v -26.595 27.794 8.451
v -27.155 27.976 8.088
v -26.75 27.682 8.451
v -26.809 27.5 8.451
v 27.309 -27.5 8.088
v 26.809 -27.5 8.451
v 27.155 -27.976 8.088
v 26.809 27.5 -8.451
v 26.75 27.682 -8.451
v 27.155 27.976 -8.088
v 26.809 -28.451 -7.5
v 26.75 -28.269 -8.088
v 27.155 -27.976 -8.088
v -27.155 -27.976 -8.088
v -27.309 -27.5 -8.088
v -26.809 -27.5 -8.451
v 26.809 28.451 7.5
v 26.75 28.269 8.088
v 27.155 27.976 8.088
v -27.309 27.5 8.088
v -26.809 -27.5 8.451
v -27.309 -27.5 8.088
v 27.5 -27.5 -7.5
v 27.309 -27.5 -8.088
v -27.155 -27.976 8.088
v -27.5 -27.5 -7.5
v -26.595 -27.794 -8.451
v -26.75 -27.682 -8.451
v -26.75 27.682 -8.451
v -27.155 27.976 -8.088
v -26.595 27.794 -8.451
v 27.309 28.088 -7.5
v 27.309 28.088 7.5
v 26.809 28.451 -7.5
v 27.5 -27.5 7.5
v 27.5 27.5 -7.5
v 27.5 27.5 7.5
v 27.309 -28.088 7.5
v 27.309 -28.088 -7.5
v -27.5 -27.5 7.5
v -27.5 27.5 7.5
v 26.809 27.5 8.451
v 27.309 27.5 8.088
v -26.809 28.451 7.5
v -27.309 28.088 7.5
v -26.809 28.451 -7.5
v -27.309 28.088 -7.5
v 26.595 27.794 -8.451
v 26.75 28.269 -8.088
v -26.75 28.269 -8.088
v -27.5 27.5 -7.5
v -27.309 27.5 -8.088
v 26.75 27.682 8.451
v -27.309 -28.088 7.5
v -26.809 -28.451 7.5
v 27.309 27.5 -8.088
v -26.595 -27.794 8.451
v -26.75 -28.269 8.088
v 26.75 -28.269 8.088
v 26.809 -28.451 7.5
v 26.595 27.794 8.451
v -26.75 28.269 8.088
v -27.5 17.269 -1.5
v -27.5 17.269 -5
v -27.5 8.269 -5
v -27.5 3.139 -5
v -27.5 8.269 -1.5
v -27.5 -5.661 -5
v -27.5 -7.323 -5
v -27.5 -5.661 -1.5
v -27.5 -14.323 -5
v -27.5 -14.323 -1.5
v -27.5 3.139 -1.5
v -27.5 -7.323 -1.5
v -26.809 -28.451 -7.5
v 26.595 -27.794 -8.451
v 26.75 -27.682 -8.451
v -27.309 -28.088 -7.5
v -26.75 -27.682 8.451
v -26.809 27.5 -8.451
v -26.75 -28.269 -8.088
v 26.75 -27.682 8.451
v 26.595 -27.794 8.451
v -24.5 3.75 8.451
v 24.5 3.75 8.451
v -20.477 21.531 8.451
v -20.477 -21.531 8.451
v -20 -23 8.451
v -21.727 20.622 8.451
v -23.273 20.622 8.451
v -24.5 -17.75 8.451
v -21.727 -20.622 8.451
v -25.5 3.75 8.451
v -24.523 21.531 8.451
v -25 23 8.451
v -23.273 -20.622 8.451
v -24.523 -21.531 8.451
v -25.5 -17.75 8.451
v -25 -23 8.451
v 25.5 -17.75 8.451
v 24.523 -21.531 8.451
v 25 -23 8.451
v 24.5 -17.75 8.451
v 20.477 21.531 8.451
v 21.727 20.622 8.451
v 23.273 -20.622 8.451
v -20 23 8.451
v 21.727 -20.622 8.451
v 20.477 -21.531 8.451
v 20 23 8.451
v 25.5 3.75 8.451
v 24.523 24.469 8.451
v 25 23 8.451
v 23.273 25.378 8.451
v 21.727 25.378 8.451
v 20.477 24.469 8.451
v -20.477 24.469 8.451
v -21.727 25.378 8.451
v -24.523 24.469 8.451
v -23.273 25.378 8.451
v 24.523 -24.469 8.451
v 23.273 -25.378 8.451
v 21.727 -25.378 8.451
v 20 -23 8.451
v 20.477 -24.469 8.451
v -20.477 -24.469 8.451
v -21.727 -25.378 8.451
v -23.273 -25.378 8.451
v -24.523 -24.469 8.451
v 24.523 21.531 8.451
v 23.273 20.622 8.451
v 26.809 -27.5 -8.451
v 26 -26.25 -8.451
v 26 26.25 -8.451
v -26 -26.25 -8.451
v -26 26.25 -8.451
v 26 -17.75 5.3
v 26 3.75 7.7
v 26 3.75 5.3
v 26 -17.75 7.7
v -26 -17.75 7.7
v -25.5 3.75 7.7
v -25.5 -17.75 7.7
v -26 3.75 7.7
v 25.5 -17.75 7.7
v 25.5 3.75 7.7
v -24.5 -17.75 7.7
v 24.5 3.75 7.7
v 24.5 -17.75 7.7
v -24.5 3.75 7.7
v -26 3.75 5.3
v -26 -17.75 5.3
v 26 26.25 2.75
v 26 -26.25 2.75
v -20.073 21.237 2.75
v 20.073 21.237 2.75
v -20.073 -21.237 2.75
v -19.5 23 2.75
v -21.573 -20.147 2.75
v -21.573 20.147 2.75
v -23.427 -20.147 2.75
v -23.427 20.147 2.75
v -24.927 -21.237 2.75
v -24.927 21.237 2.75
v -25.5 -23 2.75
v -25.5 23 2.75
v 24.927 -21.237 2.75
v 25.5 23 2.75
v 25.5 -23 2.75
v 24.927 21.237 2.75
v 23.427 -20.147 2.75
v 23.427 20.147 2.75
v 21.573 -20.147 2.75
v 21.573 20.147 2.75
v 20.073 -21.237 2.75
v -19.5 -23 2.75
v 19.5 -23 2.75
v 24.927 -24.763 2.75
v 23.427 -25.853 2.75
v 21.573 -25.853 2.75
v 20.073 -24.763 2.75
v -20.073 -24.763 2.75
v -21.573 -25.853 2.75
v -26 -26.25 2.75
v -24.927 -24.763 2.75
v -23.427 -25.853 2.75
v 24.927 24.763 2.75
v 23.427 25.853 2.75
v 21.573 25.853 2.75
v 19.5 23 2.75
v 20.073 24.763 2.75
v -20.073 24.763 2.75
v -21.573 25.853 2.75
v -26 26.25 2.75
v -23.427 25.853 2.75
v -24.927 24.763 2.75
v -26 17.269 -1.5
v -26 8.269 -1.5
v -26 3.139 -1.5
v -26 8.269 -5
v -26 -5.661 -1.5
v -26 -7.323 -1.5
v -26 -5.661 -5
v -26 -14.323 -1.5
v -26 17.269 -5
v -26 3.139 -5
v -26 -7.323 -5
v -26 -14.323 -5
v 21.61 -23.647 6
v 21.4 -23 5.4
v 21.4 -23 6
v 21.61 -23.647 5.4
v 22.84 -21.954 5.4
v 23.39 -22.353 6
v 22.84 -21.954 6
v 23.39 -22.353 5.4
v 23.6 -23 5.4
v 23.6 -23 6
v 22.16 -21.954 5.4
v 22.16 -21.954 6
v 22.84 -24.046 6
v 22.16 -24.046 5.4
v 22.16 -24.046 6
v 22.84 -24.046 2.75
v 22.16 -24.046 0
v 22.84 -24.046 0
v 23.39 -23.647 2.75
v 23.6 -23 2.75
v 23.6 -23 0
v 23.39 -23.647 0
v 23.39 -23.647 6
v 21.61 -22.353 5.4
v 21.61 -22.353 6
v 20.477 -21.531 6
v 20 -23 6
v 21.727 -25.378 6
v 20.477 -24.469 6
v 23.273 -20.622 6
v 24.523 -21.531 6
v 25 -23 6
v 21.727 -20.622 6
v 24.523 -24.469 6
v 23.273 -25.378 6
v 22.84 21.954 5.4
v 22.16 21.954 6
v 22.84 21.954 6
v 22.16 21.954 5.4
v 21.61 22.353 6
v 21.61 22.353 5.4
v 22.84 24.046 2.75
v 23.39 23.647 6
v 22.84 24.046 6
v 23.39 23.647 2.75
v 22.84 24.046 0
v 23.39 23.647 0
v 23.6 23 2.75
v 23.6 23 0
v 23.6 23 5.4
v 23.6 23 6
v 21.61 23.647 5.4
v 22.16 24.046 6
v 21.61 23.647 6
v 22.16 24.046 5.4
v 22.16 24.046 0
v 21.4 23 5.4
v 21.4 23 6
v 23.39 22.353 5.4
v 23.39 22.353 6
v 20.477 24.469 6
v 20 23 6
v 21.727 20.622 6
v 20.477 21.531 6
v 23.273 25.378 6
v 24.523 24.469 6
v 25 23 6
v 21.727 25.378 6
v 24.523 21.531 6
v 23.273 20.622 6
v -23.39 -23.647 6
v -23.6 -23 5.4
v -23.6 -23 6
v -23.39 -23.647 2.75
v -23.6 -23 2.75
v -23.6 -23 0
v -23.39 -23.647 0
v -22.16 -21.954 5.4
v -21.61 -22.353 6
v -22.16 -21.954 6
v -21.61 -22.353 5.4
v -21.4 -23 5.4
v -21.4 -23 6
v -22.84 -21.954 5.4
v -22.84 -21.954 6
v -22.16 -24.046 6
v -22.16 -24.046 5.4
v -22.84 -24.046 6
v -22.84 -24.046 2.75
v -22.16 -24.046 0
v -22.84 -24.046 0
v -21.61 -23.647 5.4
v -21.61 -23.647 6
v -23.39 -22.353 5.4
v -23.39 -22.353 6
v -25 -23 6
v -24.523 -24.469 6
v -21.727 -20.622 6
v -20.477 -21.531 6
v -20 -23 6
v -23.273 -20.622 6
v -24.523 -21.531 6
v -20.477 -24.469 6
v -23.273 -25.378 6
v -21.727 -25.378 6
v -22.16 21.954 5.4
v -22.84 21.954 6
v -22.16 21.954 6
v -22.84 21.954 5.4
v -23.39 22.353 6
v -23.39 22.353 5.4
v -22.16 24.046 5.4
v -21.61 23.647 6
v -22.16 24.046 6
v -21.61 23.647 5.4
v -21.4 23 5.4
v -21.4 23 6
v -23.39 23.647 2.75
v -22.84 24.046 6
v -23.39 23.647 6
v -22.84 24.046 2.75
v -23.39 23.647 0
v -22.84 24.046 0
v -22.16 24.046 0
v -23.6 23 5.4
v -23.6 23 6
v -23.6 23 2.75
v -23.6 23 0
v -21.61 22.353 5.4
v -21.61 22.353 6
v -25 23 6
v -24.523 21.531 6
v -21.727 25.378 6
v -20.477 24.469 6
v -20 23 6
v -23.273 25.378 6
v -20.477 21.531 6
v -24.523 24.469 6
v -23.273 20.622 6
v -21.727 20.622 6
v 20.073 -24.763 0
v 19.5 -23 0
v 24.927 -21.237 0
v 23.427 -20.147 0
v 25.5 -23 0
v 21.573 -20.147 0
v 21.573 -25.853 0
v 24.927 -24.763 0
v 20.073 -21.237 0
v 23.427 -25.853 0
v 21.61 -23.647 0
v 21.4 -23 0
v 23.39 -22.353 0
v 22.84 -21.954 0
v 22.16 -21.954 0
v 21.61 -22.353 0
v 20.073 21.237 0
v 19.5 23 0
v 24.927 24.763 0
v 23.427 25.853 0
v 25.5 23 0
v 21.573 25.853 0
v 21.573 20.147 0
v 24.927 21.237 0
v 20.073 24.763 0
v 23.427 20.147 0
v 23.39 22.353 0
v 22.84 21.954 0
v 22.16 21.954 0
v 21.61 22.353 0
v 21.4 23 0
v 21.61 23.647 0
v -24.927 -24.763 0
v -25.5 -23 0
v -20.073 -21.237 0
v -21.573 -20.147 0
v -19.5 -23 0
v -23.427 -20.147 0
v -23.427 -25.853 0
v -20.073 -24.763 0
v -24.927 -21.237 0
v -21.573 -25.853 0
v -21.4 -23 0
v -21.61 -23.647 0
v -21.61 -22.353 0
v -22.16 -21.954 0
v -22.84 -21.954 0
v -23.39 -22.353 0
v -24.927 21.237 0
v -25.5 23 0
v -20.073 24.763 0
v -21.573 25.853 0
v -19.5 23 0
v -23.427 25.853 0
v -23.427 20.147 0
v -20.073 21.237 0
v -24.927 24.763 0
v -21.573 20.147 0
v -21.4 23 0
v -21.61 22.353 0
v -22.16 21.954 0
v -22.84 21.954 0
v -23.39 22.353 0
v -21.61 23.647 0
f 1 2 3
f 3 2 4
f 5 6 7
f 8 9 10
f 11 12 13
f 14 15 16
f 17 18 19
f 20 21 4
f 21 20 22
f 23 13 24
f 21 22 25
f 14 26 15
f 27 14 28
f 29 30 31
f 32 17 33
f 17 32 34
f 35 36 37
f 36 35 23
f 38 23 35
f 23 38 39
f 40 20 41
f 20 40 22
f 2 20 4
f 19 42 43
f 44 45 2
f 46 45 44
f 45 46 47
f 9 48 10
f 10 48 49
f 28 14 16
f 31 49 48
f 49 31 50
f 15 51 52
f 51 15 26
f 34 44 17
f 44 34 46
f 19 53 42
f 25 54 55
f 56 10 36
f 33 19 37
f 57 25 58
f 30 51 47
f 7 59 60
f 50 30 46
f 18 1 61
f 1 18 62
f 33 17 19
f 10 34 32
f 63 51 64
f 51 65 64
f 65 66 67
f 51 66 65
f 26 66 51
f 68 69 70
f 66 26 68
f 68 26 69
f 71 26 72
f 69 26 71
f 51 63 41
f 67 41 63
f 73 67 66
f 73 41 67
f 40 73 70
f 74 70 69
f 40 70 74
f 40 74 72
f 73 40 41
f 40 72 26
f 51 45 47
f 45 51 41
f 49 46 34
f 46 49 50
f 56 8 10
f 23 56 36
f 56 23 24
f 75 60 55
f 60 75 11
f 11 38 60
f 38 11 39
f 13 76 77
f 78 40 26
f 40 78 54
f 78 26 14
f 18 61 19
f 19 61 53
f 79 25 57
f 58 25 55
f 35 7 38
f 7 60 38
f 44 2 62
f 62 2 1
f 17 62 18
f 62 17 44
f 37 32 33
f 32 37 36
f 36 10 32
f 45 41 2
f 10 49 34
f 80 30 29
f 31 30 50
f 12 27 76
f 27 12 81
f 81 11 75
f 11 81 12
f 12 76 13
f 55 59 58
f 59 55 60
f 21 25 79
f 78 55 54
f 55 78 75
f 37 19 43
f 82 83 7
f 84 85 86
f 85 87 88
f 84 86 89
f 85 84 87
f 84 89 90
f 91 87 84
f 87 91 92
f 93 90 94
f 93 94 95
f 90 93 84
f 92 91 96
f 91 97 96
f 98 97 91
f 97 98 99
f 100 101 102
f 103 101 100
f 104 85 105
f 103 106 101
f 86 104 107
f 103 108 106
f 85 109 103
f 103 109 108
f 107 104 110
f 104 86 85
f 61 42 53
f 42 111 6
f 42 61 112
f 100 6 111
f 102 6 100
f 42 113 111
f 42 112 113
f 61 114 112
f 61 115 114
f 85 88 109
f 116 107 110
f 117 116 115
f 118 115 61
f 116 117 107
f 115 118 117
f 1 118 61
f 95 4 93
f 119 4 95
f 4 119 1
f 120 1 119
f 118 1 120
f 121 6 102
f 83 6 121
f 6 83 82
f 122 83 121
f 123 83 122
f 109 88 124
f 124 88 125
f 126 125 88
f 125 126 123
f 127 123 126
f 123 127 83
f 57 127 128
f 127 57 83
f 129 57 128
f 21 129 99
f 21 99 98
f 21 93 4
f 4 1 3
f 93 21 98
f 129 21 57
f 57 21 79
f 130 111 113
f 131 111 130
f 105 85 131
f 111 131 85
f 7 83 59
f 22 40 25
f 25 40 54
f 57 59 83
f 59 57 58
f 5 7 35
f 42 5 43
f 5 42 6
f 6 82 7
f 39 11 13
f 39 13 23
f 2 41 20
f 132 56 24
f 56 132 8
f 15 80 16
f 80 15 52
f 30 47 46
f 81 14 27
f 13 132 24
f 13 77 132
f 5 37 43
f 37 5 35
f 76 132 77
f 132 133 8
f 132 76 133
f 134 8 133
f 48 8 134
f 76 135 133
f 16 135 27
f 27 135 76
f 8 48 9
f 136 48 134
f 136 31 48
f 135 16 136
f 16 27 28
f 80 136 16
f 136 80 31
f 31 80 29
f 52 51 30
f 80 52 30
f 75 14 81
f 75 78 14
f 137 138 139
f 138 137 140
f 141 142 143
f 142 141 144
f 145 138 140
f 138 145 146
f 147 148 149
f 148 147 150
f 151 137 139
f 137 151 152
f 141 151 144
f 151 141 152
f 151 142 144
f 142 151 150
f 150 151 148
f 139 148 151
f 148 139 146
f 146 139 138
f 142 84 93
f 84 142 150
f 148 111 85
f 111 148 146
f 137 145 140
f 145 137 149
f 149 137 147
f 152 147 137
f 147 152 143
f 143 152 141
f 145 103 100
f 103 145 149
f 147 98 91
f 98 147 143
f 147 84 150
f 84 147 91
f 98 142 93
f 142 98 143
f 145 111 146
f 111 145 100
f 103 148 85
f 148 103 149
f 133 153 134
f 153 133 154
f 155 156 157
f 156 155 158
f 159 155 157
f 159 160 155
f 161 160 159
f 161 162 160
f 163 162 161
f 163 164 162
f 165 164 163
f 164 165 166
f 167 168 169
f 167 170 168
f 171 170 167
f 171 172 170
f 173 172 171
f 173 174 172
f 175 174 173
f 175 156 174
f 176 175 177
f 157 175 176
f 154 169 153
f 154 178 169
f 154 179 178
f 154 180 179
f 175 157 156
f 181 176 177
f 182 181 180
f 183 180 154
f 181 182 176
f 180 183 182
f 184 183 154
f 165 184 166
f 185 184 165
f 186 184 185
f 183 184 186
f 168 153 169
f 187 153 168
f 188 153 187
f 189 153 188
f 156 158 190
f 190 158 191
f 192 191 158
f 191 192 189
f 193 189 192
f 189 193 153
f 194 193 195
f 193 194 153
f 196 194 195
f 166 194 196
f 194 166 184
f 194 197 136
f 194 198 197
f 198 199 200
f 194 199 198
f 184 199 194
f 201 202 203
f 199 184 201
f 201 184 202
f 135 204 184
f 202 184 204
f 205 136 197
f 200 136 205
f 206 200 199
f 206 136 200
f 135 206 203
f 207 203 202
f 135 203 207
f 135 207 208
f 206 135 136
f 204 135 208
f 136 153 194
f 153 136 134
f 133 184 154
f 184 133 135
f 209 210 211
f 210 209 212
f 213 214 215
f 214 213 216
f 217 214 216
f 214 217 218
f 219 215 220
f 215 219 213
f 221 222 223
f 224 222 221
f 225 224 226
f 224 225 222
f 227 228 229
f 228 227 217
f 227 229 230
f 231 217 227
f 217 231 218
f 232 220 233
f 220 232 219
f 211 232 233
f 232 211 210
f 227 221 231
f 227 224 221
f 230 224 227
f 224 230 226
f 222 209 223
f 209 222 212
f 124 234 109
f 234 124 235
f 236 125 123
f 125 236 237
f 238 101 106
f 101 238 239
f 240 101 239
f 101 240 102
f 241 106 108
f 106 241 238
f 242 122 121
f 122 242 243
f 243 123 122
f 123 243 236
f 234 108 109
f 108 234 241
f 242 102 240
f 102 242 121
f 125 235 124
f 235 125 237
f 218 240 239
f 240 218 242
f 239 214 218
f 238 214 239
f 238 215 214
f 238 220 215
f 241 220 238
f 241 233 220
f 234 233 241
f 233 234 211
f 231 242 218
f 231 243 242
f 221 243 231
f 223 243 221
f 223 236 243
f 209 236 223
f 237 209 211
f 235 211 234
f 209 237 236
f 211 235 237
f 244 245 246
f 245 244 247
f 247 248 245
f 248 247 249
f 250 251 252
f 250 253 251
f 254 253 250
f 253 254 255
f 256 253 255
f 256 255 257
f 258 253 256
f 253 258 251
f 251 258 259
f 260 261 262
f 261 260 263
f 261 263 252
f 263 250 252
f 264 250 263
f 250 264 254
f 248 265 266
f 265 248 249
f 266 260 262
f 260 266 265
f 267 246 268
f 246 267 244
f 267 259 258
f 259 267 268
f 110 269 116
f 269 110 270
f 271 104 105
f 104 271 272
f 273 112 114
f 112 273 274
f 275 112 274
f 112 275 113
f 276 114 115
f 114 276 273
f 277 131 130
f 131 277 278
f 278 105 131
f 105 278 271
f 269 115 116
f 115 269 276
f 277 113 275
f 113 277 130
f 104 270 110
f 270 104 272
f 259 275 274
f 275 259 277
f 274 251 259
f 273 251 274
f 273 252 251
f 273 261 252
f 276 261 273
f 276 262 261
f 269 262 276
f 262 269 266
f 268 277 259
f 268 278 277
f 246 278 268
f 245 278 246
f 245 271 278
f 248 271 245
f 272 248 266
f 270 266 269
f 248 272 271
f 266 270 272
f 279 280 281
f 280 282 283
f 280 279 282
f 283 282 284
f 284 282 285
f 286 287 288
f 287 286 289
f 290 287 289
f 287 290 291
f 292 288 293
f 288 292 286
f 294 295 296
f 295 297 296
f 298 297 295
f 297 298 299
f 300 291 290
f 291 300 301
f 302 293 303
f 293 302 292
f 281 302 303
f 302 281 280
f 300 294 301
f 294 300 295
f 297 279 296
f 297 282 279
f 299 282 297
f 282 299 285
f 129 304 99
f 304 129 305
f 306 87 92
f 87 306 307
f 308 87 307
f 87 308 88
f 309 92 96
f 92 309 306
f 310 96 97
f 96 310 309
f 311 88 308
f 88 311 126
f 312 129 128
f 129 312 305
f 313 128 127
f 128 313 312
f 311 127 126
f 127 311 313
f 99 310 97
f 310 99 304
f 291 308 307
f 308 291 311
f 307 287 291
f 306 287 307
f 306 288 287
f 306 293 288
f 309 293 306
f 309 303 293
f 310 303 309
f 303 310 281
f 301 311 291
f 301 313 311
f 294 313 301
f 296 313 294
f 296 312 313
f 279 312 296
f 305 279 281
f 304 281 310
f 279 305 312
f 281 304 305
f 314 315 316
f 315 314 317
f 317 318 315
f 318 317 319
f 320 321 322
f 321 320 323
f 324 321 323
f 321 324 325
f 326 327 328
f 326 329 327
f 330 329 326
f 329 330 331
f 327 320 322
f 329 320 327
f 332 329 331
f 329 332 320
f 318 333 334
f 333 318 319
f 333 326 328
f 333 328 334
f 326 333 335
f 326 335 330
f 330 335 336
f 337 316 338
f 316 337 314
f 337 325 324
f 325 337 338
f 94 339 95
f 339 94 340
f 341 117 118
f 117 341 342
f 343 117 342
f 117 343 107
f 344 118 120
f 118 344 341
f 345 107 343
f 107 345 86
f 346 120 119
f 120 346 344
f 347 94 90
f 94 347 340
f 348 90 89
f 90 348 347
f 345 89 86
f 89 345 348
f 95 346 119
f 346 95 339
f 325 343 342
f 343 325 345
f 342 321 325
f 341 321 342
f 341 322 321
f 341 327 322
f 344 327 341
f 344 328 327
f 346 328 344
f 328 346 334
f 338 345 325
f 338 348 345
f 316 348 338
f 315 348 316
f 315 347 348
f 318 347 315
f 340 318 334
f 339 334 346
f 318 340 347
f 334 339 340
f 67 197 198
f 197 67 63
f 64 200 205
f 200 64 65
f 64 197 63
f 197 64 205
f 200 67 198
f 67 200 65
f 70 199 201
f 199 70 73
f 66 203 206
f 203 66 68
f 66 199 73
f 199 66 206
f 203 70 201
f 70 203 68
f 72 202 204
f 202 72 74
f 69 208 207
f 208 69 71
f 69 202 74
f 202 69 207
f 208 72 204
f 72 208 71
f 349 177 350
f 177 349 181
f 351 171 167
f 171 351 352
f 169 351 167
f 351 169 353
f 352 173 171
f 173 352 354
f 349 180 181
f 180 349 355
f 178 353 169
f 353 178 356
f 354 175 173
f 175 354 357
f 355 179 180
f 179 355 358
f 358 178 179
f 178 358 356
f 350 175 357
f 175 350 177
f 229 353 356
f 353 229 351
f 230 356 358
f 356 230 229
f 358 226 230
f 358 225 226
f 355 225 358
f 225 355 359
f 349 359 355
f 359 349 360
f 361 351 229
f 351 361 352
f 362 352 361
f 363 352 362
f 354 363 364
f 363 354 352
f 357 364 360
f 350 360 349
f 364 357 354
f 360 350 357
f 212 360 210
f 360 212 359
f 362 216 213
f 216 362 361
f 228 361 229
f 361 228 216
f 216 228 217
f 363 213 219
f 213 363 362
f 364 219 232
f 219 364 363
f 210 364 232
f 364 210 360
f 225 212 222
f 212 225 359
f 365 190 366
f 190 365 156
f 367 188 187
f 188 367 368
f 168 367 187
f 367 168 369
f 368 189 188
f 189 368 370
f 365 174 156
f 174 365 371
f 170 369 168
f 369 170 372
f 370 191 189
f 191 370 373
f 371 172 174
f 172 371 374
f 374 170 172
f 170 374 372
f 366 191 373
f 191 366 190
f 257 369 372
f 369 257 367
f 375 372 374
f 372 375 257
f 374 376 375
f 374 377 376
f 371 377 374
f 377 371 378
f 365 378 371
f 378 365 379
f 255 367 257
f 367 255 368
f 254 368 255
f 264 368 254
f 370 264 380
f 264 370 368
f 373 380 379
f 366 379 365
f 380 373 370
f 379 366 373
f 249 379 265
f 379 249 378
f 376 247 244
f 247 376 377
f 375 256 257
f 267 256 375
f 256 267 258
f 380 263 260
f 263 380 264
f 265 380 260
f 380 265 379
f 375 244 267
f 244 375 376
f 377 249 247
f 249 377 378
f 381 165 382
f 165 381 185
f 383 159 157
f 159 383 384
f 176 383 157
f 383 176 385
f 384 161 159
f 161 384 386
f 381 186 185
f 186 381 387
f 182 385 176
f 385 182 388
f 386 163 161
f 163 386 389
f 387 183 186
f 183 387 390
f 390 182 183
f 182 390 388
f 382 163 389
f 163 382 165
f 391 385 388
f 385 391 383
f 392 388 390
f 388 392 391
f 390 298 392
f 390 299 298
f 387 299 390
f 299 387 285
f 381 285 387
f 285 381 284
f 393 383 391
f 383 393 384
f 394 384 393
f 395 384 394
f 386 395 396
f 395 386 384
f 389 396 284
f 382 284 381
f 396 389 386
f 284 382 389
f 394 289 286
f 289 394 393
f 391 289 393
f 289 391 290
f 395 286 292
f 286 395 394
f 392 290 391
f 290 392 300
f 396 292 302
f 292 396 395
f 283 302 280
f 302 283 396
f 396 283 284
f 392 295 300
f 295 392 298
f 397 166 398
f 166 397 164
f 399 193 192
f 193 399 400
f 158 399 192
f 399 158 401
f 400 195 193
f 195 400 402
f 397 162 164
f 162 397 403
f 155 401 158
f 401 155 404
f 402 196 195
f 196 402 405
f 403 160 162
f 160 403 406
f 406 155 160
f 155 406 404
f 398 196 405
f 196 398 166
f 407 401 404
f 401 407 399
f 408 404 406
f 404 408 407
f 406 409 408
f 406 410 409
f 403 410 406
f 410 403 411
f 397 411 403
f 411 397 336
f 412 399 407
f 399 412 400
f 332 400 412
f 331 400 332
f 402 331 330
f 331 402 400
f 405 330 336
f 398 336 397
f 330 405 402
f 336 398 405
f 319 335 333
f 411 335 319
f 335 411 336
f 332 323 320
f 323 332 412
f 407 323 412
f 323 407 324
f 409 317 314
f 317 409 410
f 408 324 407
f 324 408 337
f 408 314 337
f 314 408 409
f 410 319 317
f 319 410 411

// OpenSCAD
//import("product.stl");
    
$fn = 10; 


difference() {
    

     minkowski() {
     cube([53, 55, 15], center = true);
          sphere(r = 1); // Radius of fillet
     }
    
    // strap
     
    translate([0, -7, 6.5])
    #cube([52, 21.5, 2.4], center = true);
     
    translate([-25, -7, 8])
    #cube([1, 21.5, 1.5], center = true);
     
    translate([25, -7, 8])
    #cube([1, 21.5, 1.5], center = true);
     
    // main hole
     
    translate([0, 0, -3])
    cube([52, 52.5, 11.5], center = true);
     
    // top nuts
    translate([22.5, -23, 0])
    cylinder(10, r = 1.1);
     
    translate([22.5, -23, 6])
    cylinder(3, r = 2.5);
    
    translate([22.5, 23, 0])
    cylinder(10, r = 1.1);
     
    translate([22.5, 23, 6])
    cylinder(3, r = 2.5);
    
    translate([-22.5, -23, 0])
    cylinder(10, r = 1.1);
     
    translate([-22.5, -23, 6])
    cylinder(3, r = 2.5);
    
    translate([-22.5, 23, 0])
    cylinder(10, r = 1.1);
     
    translate([-22.5, 23, 6])
    cylinder(3, r = 2.5);
    
    // usb c port
    
    translate([-28, 8.269, -5])
    cube([4, 9, 3.5]);
    
    // Power switch hole
    
    translate([-28, -5.661, -5])
    #cube([4, 8.8, 3.5]);
    
    // button hole
    
    translate([-28, -14.323, -5])
    #cube([4, 7, 3.5]);
 }

// screw posts
 translate([22.5, -23, 0])
 difference() {
 cylinder(5.4, r = 3);
 
     
 cylinder(10, r = 1.1);
     
 }
 
  translate([22.5, 23, 0])
 difference() {
 cylinder(5.4, r = 3);
 
     
 cylinder(10, r = 1.1);
     
 }
 
  translate([-22.5, -23, 0])
 difference() {
 cylinder(5.4, r = 3);
 
     
 cylinder(10, r = 1.1);
     
 }
 
  translate([-22.5, 23, 0])
 difference() {
 cylinder(5.4, r = 3);
 
     
 cylinder(10, r = 1.1);
     
 }
